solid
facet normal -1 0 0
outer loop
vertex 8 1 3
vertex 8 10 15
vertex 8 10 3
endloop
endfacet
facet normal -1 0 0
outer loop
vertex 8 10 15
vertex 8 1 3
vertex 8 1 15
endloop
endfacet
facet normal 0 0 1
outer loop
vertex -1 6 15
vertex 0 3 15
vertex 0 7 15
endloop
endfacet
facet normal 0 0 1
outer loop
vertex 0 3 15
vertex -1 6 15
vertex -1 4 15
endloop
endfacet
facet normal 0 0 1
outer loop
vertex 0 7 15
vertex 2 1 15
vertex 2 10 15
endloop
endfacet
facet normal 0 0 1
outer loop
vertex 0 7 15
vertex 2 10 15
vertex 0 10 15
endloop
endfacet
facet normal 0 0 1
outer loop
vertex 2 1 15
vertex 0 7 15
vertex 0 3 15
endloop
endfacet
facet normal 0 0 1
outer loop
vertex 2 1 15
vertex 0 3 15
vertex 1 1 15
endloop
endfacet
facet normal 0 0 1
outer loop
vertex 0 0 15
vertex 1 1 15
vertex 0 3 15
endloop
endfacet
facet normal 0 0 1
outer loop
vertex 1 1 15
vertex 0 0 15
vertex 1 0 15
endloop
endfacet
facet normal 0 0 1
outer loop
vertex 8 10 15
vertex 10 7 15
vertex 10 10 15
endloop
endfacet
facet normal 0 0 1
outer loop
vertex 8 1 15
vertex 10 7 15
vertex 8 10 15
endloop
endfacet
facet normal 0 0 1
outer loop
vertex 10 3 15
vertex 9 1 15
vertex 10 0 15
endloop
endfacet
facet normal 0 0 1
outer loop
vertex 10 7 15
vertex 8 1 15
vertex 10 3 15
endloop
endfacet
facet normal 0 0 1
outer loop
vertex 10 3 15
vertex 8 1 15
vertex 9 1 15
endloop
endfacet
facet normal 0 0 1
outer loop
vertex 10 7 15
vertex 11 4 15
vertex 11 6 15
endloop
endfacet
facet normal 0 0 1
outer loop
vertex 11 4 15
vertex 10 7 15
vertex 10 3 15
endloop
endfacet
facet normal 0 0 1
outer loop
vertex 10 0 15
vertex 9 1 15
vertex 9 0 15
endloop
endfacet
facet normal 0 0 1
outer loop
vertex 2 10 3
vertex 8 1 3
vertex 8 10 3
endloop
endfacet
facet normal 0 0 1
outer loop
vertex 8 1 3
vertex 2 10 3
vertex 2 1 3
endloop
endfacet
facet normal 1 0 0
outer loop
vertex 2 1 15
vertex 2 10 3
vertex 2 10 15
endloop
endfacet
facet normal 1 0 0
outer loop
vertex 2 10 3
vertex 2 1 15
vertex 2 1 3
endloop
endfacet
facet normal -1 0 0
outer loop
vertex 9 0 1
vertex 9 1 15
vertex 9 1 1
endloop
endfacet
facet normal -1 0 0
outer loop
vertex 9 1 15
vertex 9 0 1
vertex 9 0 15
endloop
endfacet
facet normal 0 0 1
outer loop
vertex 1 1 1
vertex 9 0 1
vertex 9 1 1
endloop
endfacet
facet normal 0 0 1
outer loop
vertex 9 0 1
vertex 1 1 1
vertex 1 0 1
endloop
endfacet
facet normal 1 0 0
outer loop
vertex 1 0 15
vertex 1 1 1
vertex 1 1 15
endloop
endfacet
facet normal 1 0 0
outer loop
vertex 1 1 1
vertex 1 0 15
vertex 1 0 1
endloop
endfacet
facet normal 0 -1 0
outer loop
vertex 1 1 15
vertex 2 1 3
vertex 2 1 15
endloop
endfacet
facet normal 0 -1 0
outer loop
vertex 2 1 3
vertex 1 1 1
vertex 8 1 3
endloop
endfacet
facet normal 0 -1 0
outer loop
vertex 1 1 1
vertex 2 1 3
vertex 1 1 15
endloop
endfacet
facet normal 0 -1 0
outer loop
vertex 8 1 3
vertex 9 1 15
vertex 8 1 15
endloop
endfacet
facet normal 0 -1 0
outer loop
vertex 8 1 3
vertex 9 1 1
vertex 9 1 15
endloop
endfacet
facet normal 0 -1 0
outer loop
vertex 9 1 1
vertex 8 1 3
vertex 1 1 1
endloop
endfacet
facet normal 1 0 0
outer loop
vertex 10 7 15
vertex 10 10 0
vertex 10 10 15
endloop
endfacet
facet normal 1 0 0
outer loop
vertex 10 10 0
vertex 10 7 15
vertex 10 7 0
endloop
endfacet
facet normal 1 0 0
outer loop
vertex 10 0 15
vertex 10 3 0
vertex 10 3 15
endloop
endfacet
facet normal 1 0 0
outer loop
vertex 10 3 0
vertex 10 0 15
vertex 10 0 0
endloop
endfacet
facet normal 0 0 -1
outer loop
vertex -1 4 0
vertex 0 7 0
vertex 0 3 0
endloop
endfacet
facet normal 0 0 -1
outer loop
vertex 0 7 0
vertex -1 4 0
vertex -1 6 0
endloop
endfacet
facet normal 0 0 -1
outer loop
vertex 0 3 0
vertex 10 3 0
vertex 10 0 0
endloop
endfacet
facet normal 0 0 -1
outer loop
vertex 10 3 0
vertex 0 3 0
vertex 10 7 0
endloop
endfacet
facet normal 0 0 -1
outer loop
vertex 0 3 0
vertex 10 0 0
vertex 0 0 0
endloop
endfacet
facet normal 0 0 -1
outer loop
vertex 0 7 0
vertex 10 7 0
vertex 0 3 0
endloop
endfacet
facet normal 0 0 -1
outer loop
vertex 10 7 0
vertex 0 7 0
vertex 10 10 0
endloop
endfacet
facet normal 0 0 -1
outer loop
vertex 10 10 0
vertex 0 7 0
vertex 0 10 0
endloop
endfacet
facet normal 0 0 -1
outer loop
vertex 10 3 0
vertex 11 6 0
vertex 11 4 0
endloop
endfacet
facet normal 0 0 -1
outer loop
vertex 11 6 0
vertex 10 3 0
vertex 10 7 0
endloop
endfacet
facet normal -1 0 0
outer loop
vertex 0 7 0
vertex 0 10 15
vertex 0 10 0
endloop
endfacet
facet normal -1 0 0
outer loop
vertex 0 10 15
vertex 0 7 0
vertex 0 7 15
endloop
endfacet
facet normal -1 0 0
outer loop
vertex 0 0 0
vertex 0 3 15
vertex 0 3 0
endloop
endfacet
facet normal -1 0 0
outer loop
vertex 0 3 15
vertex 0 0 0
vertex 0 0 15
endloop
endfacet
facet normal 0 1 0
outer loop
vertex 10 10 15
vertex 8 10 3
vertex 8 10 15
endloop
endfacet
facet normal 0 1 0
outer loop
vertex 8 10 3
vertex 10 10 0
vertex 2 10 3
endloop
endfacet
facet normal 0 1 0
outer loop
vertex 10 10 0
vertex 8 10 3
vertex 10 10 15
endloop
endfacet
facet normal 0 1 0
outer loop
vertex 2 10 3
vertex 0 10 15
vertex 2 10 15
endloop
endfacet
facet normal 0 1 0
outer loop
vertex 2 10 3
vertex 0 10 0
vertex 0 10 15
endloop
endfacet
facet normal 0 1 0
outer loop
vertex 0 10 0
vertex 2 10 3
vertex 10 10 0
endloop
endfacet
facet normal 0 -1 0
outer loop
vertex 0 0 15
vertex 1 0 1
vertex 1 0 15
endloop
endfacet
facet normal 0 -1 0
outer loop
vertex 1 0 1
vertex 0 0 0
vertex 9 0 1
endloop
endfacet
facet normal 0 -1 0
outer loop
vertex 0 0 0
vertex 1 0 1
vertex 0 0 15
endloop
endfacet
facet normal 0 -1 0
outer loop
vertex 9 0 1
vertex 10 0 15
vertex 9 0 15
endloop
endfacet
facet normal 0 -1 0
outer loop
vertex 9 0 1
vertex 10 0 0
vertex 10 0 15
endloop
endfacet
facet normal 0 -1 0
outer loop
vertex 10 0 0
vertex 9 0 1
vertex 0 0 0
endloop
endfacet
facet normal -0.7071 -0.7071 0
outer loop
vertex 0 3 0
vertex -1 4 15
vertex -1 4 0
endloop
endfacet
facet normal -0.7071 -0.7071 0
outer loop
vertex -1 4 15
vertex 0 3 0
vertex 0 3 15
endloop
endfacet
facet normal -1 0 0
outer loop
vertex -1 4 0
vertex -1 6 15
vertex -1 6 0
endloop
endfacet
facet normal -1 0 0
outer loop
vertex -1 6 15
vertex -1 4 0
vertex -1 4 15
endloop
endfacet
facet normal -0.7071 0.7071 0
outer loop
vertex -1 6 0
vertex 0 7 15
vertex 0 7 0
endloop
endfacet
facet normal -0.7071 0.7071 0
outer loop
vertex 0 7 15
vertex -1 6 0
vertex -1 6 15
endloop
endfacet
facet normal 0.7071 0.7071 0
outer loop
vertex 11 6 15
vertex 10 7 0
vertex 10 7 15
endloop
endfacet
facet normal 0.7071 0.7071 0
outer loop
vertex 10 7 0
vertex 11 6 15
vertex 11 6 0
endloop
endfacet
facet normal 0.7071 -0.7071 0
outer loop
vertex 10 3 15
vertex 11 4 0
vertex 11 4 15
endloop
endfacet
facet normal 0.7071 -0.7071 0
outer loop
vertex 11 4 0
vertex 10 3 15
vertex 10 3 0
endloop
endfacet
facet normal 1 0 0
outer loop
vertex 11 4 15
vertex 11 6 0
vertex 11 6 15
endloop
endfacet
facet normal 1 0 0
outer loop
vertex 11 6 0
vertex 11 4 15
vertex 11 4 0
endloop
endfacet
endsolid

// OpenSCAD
socketLength = 6; // x
socketWidth = 12; // z
socketDepth = 9; // y

verticalOffSet = 3;
horizontalOffset = 2;

holeLength = socketLength; // x
holeWidth = socketWidth; // z
holeDepth = socketDepth + 1; // y

vertLip = 2;
horzLip = 1;

bodyLength = holeLength + horizontalOffset * 2; // x
bodyWidth = holeWidth + verticalOffSet; // z
bodyDepth = holeDepth; // y

//translate ([20,20,0])
difference() {
    cube ([bodyLength,bodyDepth,bodyWidth]);

    union() {
        translate ([horizontalOffset,-1,verticalOffSet])
        cube ([socketLength,holeDepth + 2 ,holeWidth]);
        translate ([horizontalOffset - horzLip,-1,verticalOffSet - vertLip])
        cube ([socketLength + (horzLip * 2),2 ,holeWidth + (2 * vertLip)]);
    }
}

runner();

translate([bodyLength,0,0])
mirror([1,0,0])
    runner();

module runner() {
    linear_extrude(bodyWidth)
        translate([0,3,0])
            rotate([0,0,90])
                polygon (
                    [
                        [0,0],
                        [1,1],
                        [3,1],
                        [4,0],
                        [4,-1],
                        [0,-1]
                ]);
}
